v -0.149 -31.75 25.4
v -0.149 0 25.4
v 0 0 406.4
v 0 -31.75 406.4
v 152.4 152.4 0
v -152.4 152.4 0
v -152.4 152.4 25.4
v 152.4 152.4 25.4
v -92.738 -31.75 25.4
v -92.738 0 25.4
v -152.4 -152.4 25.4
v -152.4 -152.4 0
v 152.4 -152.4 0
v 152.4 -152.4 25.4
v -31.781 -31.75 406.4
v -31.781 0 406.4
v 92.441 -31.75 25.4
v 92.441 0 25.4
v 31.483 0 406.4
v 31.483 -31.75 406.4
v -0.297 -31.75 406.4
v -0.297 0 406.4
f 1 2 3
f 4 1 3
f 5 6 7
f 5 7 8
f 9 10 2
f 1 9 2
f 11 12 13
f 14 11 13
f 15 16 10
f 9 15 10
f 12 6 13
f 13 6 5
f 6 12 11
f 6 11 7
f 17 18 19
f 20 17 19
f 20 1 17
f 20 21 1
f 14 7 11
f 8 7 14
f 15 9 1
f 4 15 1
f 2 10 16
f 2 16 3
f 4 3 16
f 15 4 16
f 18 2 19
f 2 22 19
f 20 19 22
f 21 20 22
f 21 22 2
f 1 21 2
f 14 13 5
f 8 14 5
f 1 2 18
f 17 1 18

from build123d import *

# Parameters (mm, degrees)
F0_W     = 304.8
F0_H     = 304.8
F1_DEPTH = 25.4
F4_DEPTH = 31.75


with BuildPart() as f1:
    # F0 (on Top) → F1 (new body)
    with BuildSketch(Plane.XY):
        Rectangle(F0_W, F0_H)
    extrude(amount=F1_DEPTH)


with BuildPart() as f4:
    # F3 (on Front) → F4 (new body)
    with BuildSketch(Plane.XZ):
        Polygon((-0.1485930994, 25.4), (92.4412335724, 25.4), (31.4833547443, 406.3999710237), (-0.2971861988, 406.3999710237), align=None)
    extrude(amount=F4_DEPTH)


with BuildPart() as f4b:
    # F2 (on Front) → F4, piece 2 (new body)
    with BuildSketch(Plane.XZ):
        Polygon((-31.7805409431, 406.3999710237), (-92.7384197712, 25.4), (-0.1485930994, 25.4), (0, 406.3999710237), align=None)
    extrude(amount=F4_DEPTH)


solid = Compound([f1.part, f4.part, f4b.part])
